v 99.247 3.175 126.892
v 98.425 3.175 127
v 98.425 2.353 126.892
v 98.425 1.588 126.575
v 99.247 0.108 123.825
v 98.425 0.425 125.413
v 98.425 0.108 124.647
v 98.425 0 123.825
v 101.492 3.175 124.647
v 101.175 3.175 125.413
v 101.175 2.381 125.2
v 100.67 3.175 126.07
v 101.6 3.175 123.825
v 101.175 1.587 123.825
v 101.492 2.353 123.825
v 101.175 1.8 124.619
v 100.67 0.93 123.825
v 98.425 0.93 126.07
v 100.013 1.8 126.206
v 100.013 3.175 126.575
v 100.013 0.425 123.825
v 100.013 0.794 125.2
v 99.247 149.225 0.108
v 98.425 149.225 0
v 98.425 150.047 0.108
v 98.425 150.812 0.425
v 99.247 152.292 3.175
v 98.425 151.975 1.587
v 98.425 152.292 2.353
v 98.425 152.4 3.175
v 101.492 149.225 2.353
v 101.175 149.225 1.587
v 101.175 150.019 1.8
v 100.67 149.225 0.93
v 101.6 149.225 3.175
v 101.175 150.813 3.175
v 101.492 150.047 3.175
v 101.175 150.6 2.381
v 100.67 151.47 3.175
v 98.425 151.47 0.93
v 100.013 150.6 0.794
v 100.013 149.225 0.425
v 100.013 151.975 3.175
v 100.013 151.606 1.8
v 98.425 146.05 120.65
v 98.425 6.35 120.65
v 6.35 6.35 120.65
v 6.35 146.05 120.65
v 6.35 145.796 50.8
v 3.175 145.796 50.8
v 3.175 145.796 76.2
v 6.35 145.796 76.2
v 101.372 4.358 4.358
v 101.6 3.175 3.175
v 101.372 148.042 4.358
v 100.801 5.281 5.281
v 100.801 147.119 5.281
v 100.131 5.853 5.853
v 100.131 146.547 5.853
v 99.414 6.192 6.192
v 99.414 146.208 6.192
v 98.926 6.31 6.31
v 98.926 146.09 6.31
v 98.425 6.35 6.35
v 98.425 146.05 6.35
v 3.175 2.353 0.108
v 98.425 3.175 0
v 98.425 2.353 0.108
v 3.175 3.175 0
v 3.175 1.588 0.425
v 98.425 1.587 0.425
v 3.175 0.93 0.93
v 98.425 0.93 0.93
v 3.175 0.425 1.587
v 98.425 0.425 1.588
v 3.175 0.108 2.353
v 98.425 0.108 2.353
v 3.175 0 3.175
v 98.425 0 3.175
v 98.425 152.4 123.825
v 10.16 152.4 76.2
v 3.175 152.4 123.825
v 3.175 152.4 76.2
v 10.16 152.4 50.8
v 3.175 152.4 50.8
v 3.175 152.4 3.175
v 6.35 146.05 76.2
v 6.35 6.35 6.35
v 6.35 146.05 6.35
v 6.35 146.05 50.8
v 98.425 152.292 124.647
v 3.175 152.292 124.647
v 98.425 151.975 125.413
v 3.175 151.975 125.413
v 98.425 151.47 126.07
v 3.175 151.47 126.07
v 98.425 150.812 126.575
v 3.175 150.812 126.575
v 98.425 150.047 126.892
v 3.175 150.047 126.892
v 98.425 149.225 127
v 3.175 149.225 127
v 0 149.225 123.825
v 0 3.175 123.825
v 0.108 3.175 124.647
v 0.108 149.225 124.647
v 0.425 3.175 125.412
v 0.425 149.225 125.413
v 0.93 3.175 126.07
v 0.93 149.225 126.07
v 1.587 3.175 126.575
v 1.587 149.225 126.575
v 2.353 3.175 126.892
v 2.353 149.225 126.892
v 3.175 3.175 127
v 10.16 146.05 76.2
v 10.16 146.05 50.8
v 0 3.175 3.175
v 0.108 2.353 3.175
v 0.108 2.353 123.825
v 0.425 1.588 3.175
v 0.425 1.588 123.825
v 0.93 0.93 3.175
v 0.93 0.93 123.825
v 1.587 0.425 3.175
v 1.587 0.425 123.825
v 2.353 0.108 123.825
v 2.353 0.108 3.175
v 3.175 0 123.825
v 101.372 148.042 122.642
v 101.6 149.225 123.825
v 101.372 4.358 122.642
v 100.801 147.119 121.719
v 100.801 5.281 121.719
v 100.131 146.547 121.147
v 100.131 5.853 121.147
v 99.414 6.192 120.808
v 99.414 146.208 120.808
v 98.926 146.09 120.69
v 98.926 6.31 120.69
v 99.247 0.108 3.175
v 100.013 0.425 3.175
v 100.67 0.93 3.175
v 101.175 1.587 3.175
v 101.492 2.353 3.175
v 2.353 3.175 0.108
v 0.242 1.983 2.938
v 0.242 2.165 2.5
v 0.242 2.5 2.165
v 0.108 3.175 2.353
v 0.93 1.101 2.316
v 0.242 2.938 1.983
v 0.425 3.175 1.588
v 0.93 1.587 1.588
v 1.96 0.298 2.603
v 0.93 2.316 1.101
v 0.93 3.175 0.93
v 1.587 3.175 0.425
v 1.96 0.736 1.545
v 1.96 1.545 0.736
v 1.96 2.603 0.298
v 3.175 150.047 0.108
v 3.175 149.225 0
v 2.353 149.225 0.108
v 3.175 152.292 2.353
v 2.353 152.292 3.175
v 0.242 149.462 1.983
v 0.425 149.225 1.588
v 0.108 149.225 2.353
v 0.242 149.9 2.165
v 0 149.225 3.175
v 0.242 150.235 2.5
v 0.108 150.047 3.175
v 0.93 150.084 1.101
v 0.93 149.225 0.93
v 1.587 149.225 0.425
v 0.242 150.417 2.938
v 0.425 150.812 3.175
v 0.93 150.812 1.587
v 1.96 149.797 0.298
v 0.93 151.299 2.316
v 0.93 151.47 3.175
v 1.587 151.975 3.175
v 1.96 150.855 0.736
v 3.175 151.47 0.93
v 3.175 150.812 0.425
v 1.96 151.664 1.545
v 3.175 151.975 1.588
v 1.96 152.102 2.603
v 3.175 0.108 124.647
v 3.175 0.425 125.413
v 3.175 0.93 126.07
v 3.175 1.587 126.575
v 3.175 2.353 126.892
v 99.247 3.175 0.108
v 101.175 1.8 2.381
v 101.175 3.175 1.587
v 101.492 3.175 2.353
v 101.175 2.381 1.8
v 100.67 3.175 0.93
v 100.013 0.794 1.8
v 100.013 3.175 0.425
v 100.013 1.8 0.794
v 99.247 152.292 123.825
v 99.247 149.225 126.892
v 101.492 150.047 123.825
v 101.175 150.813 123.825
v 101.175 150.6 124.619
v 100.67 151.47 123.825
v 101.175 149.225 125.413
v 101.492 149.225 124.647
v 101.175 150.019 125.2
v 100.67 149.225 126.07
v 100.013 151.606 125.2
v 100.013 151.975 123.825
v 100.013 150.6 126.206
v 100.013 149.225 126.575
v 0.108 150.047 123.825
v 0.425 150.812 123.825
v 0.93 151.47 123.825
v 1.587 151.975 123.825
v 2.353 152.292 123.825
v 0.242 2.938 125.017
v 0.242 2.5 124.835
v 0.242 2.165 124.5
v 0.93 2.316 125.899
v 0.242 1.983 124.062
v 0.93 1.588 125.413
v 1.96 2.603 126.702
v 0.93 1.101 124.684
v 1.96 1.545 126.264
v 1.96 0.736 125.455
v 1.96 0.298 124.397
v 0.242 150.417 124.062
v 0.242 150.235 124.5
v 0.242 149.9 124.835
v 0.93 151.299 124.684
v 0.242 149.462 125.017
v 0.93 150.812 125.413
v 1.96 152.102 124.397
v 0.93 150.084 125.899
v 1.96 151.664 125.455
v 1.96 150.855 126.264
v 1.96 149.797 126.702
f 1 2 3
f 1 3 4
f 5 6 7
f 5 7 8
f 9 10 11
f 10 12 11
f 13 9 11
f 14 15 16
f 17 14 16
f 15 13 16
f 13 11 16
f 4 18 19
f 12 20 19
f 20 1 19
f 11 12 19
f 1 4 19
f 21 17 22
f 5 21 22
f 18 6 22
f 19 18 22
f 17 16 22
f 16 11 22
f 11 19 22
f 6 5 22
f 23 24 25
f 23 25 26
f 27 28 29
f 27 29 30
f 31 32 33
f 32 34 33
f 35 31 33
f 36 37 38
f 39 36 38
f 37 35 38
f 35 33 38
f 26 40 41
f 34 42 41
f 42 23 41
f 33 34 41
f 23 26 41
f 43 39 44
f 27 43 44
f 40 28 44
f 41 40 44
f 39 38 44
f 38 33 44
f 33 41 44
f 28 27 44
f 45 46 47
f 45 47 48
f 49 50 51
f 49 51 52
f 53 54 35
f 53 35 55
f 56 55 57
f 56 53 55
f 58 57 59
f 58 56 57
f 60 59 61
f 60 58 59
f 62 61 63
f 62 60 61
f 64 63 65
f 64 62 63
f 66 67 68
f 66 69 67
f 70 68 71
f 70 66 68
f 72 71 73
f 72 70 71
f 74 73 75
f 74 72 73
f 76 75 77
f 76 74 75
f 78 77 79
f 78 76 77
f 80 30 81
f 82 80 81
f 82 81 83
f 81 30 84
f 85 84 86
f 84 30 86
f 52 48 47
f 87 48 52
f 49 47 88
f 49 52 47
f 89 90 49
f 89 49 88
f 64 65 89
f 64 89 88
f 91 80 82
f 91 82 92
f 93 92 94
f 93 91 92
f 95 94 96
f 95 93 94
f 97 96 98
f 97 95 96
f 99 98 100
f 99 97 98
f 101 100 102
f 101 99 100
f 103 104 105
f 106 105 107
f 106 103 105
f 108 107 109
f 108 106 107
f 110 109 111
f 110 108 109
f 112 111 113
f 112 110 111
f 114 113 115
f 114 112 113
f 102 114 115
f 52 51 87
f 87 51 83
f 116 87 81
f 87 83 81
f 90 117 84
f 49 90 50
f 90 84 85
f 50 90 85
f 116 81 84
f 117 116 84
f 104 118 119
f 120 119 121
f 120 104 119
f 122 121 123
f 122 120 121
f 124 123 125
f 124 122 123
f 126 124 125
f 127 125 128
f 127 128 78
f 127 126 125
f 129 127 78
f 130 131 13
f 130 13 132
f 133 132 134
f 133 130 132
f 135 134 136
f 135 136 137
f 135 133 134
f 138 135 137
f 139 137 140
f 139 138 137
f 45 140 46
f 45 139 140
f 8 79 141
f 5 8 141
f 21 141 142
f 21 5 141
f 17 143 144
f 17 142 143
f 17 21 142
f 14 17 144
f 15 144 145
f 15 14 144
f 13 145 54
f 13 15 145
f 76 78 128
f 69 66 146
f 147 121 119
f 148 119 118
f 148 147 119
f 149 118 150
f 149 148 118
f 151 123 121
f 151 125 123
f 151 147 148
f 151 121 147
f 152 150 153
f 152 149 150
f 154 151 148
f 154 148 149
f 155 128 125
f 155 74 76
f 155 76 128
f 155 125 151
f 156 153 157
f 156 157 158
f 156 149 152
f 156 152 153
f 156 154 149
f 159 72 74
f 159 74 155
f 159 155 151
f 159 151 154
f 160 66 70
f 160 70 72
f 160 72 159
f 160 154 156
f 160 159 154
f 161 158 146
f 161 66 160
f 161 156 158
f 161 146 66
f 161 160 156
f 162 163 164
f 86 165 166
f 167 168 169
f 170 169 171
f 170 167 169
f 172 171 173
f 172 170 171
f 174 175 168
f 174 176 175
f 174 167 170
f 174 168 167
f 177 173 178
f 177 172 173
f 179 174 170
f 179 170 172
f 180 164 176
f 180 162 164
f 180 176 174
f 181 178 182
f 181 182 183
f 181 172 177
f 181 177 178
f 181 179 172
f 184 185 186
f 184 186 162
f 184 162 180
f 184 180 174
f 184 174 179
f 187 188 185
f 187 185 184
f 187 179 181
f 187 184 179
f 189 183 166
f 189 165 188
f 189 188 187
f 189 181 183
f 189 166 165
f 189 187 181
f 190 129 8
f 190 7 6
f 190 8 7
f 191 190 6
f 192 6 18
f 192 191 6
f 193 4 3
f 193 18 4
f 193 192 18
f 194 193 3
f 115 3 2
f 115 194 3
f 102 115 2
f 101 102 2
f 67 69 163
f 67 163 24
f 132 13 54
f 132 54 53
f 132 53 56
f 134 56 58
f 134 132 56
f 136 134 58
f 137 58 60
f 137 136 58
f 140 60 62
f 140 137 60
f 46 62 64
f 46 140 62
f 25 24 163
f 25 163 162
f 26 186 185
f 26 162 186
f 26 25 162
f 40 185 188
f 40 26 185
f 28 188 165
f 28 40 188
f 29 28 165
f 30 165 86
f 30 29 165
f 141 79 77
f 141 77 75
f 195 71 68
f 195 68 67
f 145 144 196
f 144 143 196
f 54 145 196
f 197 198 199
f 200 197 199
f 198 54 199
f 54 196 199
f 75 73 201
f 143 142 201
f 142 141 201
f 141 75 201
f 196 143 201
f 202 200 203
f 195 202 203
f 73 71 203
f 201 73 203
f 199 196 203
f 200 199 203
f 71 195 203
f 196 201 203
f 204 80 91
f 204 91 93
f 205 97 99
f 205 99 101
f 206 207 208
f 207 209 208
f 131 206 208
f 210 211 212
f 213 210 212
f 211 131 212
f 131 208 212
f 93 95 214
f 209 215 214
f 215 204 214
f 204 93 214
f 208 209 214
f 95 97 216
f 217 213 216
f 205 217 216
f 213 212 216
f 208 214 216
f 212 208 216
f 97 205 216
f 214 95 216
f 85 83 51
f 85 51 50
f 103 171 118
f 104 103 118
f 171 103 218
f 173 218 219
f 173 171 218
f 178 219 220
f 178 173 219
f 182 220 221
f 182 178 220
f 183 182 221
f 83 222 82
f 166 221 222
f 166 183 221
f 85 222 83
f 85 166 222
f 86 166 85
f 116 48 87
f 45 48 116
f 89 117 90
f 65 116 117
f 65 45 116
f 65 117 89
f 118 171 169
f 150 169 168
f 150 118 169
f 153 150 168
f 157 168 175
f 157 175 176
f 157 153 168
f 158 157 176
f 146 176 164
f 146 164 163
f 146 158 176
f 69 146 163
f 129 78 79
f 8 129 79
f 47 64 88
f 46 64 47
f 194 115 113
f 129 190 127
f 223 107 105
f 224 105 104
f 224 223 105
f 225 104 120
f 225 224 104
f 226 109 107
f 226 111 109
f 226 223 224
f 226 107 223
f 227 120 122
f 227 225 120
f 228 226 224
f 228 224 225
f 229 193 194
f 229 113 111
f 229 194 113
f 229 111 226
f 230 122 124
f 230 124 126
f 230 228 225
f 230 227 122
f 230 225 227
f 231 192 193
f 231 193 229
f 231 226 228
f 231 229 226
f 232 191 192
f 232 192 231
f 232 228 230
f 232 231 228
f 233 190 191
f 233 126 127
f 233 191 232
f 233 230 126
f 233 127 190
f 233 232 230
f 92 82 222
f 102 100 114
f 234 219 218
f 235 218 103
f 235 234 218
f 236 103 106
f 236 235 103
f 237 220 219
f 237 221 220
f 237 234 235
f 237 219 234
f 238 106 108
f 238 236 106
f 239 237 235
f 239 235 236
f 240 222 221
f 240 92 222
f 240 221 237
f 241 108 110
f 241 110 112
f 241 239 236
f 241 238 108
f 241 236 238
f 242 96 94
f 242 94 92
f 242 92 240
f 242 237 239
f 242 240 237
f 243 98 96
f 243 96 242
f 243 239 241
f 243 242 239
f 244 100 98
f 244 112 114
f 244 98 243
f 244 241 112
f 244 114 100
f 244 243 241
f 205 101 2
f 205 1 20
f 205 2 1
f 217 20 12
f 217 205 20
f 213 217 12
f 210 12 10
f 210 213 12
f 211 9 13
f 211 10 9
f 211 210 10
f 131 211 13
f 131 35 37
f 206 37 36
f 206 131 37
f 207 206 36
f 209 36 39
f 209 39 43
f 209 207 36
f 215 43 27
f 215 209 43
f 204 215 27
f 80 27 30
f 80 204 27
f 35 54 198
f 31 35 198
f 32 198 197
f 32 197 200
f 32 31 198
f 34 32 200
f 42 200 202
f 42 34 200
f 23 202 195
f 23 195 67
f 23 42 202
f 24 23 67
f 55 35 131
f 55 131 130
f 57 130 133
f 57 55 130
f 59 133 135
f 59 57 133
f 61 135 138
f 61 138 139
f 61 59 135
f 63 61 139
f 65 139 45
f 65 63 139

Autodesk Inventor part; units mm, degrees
ref_plane "YZ Plane" through (0, 0, 0) normal (1, 0, 0) x (0, 1, 0)
ref_plane "XZ Plane" through (0, 0, 0) normal (0, 1, 0) x (-1, 0, 0)
ref_plane "XY Plane" through (0, 0, 0) normal (0, 0, 1) x (1, 0, 0)
sketch "Sketch1" plane through (0, 0, 0) normal (0, 0, 1) x (1, 0, 0)
  line L0 (0, 0) -> (101.6, 0)
  line L1 (101.6, 0) -> (101.6, 152.4)
  line L2 (101.6, 152.4) -> (0, 152.4)
  line L3 (0, 152.4) -> (0, 0)
  dimension "d0" = 101.6
  dimension "d1" = 152.4
sketch "Sketch2" plane through (0, 0, 0) normal (0, 0, 1) x (1, 0, 0)
  point P0 (0, 0)
sketch "Sketch3" plane through (0, 0, 0) normal (0, 0, 1) x (1, 0, 0)
  point P0 (0, 0)
extrude "Extrusion1" add sketch "Sketch1" along normal blind 127
sketch "Sketch4" plane through (101.6, 0, 0) normal (1, 0, 0) x (0, 0, -1)
  line L0 (0, 0) -> (-127, 0) projected
  line L1 (0, 0) -> (-6.35, 0)
  line L2 (-6.35, 0) -> (-6.35, 6.35)
  line L3 (-6.35, 6.35) -> (0, 6.35)
  line L4 (0, 6.35) -> (0, 0)
  line L5 (-6.35, 6.35) -> (-120.65, 6.35)
  line L6 (-120.65, 6.35) -> (-120.65, 146.05)
  line L7 (-120.65, 146.05) -> (-6.35, 146.05)
  line L8 (-6.35, 146.05) -> (-6.35, 6.35)
  dimension "d4" = 6.35
  dimension "d5" = 6.35
  dimension "d6" = 114.3
  dimension "d7" = 139.7
extrude "Extrusion2" cut sketch "Sketch4" against normal blind 95.25 contours L5 L6 L7 L8
fillet "Fillet1" radius 3.175 8 edges at (101.6, 146.05, 63.5) (101.6, 152.4, 63.5) (101.6, 76.2, 127) (101.6, 76.2, 120.65) (101.6, 76.2, 6.35) (101.6, 76.2, 0) (101.6, 6.35, 63.5) (101.6, 0, 63.5)
fillet "Fillet2" radius 3.175 8 edges at (100.6701, 151.4701, 126.0701) (49.2126, 152.4, 127) (100.6701, 151.4701, 0.9299) (49.2126, 152.4, 0) (100.6701, 0.9299, 126.0701) (49.2126, 0, 127) (100.6701, 0.9299, 0.9299) (49.2126, 0, 0)
fillet "Fillet3" radius 3.175 8 edges at (0, 0.9299, 0.9299) (0, 0, 63.5) (0, 0.9299, 126.0701) (0, 76.2, 127) (0, 151.4701, 126.0701) (0, 152.4, 63.5) (0, 151.4701, 0.9299) (0, 76.2, 0)
sketch "Sketch5" plane through (6.35, 6.35, 6.35) normal (0, 0, 1) x (1, 0, 0)
  line L0 (92.075, 0) -> (0, 0) projected
  arc A0 (95.25, -3.175) -> (92.075, 0) centre (92.075, -3.175) ccw projected
  line L1 (92.075, 0) -> (89.535, 0)
  line L2 (92.075, 0) -> (94.615, 0) construction
  line L3 (91.2996, 0) -> (88.936, -0.9299)
  point P0 (-6.35, -6.35)
sketch "Sketch6" plane through (6.35, 6.35, 6.35) normal (0, 0, 1) x (1, 0, 0)
  point P0 (-6.35, -6.35)
sketch "Sketch7" plane through (98.425, 152.4, 123.825) normal (0, 1, 0) x (1, 0, 0)
  line L0 (-95.25, 120.65) -> (0, 120.65) projected
  line L1 (-95.25, 120.65) -> (-95.25, 73.025)
  line L2 (0, 0) -> (-95.25, 0) projected
  arc A0 (-98.425, 0) -> (-95.25, -3.175) centre (-95.25, 0) ccw projected
  line L3 (-92.075, 3.175) -> (-92.075, 117.475) projected
  line L4 (-95.25, 0) -> (-98.425, 0) projected
  line L5 (-95.25, 0) -> (-95.25, 47.625)
  line L6 (-95.25, 0) -> (-95.25, 120.65) projected
  line L7 (-95.25, 73.025) -> (-95.25, 47.625)
  line L8 (-95.25, 47.625) -> (-91.44, 47.625)
  line L9 (-91.44, 47.625) -> (-91.44, 73.025)
  line L10 (-91.44, 73.025) -> (-95.25, 73.025)
  point P0 (-98.425, 123.825)
  point P1 (-92.075, 73.025)
  point P2 (-92.075, 47.625)
  dimension "d17" = 47.625
  dimension "d20" = 47.625
  dimension "d21" = 3.81
sketch "Sketch8" plane through (98.425, 152.4, 123.825) normal (0, 1, 0) x (1, 0, 0)
  point P0 (-98.425, 123.825)
extrude "Extrusion3" cut sketch "Sketch7" against normal blind 6.604 contours L8 L6 L10 L3
sketch "Sketch9" plane through (98.425, 152.4, 123.825) normal (0, 1, 0) x (1, 0, 0)
  line L0 (-95.25, 73.025) -> (-92.075, 73.025) projected
  line L1 (-92.075, 73.025) -> (-92.075, 47.625) projected
  line L2 (-92.075, 73.025) -> (-92.075, 47.625)
  line L3 (-92.075, 47.625) -> (-88.265, 47.625)
  line L4 (-88.265, 47.625) -> (-88.265, 73.025)
  line L5 (-88.265, 73.025) -> (-92.075, 73.025)
  point P0 (-98.425, 123.825)
  dimension "d24" = 3.81
extrude "Extrusion4" cut sketch "Sketch9" against normal blind 7.62
properties part number "box"
